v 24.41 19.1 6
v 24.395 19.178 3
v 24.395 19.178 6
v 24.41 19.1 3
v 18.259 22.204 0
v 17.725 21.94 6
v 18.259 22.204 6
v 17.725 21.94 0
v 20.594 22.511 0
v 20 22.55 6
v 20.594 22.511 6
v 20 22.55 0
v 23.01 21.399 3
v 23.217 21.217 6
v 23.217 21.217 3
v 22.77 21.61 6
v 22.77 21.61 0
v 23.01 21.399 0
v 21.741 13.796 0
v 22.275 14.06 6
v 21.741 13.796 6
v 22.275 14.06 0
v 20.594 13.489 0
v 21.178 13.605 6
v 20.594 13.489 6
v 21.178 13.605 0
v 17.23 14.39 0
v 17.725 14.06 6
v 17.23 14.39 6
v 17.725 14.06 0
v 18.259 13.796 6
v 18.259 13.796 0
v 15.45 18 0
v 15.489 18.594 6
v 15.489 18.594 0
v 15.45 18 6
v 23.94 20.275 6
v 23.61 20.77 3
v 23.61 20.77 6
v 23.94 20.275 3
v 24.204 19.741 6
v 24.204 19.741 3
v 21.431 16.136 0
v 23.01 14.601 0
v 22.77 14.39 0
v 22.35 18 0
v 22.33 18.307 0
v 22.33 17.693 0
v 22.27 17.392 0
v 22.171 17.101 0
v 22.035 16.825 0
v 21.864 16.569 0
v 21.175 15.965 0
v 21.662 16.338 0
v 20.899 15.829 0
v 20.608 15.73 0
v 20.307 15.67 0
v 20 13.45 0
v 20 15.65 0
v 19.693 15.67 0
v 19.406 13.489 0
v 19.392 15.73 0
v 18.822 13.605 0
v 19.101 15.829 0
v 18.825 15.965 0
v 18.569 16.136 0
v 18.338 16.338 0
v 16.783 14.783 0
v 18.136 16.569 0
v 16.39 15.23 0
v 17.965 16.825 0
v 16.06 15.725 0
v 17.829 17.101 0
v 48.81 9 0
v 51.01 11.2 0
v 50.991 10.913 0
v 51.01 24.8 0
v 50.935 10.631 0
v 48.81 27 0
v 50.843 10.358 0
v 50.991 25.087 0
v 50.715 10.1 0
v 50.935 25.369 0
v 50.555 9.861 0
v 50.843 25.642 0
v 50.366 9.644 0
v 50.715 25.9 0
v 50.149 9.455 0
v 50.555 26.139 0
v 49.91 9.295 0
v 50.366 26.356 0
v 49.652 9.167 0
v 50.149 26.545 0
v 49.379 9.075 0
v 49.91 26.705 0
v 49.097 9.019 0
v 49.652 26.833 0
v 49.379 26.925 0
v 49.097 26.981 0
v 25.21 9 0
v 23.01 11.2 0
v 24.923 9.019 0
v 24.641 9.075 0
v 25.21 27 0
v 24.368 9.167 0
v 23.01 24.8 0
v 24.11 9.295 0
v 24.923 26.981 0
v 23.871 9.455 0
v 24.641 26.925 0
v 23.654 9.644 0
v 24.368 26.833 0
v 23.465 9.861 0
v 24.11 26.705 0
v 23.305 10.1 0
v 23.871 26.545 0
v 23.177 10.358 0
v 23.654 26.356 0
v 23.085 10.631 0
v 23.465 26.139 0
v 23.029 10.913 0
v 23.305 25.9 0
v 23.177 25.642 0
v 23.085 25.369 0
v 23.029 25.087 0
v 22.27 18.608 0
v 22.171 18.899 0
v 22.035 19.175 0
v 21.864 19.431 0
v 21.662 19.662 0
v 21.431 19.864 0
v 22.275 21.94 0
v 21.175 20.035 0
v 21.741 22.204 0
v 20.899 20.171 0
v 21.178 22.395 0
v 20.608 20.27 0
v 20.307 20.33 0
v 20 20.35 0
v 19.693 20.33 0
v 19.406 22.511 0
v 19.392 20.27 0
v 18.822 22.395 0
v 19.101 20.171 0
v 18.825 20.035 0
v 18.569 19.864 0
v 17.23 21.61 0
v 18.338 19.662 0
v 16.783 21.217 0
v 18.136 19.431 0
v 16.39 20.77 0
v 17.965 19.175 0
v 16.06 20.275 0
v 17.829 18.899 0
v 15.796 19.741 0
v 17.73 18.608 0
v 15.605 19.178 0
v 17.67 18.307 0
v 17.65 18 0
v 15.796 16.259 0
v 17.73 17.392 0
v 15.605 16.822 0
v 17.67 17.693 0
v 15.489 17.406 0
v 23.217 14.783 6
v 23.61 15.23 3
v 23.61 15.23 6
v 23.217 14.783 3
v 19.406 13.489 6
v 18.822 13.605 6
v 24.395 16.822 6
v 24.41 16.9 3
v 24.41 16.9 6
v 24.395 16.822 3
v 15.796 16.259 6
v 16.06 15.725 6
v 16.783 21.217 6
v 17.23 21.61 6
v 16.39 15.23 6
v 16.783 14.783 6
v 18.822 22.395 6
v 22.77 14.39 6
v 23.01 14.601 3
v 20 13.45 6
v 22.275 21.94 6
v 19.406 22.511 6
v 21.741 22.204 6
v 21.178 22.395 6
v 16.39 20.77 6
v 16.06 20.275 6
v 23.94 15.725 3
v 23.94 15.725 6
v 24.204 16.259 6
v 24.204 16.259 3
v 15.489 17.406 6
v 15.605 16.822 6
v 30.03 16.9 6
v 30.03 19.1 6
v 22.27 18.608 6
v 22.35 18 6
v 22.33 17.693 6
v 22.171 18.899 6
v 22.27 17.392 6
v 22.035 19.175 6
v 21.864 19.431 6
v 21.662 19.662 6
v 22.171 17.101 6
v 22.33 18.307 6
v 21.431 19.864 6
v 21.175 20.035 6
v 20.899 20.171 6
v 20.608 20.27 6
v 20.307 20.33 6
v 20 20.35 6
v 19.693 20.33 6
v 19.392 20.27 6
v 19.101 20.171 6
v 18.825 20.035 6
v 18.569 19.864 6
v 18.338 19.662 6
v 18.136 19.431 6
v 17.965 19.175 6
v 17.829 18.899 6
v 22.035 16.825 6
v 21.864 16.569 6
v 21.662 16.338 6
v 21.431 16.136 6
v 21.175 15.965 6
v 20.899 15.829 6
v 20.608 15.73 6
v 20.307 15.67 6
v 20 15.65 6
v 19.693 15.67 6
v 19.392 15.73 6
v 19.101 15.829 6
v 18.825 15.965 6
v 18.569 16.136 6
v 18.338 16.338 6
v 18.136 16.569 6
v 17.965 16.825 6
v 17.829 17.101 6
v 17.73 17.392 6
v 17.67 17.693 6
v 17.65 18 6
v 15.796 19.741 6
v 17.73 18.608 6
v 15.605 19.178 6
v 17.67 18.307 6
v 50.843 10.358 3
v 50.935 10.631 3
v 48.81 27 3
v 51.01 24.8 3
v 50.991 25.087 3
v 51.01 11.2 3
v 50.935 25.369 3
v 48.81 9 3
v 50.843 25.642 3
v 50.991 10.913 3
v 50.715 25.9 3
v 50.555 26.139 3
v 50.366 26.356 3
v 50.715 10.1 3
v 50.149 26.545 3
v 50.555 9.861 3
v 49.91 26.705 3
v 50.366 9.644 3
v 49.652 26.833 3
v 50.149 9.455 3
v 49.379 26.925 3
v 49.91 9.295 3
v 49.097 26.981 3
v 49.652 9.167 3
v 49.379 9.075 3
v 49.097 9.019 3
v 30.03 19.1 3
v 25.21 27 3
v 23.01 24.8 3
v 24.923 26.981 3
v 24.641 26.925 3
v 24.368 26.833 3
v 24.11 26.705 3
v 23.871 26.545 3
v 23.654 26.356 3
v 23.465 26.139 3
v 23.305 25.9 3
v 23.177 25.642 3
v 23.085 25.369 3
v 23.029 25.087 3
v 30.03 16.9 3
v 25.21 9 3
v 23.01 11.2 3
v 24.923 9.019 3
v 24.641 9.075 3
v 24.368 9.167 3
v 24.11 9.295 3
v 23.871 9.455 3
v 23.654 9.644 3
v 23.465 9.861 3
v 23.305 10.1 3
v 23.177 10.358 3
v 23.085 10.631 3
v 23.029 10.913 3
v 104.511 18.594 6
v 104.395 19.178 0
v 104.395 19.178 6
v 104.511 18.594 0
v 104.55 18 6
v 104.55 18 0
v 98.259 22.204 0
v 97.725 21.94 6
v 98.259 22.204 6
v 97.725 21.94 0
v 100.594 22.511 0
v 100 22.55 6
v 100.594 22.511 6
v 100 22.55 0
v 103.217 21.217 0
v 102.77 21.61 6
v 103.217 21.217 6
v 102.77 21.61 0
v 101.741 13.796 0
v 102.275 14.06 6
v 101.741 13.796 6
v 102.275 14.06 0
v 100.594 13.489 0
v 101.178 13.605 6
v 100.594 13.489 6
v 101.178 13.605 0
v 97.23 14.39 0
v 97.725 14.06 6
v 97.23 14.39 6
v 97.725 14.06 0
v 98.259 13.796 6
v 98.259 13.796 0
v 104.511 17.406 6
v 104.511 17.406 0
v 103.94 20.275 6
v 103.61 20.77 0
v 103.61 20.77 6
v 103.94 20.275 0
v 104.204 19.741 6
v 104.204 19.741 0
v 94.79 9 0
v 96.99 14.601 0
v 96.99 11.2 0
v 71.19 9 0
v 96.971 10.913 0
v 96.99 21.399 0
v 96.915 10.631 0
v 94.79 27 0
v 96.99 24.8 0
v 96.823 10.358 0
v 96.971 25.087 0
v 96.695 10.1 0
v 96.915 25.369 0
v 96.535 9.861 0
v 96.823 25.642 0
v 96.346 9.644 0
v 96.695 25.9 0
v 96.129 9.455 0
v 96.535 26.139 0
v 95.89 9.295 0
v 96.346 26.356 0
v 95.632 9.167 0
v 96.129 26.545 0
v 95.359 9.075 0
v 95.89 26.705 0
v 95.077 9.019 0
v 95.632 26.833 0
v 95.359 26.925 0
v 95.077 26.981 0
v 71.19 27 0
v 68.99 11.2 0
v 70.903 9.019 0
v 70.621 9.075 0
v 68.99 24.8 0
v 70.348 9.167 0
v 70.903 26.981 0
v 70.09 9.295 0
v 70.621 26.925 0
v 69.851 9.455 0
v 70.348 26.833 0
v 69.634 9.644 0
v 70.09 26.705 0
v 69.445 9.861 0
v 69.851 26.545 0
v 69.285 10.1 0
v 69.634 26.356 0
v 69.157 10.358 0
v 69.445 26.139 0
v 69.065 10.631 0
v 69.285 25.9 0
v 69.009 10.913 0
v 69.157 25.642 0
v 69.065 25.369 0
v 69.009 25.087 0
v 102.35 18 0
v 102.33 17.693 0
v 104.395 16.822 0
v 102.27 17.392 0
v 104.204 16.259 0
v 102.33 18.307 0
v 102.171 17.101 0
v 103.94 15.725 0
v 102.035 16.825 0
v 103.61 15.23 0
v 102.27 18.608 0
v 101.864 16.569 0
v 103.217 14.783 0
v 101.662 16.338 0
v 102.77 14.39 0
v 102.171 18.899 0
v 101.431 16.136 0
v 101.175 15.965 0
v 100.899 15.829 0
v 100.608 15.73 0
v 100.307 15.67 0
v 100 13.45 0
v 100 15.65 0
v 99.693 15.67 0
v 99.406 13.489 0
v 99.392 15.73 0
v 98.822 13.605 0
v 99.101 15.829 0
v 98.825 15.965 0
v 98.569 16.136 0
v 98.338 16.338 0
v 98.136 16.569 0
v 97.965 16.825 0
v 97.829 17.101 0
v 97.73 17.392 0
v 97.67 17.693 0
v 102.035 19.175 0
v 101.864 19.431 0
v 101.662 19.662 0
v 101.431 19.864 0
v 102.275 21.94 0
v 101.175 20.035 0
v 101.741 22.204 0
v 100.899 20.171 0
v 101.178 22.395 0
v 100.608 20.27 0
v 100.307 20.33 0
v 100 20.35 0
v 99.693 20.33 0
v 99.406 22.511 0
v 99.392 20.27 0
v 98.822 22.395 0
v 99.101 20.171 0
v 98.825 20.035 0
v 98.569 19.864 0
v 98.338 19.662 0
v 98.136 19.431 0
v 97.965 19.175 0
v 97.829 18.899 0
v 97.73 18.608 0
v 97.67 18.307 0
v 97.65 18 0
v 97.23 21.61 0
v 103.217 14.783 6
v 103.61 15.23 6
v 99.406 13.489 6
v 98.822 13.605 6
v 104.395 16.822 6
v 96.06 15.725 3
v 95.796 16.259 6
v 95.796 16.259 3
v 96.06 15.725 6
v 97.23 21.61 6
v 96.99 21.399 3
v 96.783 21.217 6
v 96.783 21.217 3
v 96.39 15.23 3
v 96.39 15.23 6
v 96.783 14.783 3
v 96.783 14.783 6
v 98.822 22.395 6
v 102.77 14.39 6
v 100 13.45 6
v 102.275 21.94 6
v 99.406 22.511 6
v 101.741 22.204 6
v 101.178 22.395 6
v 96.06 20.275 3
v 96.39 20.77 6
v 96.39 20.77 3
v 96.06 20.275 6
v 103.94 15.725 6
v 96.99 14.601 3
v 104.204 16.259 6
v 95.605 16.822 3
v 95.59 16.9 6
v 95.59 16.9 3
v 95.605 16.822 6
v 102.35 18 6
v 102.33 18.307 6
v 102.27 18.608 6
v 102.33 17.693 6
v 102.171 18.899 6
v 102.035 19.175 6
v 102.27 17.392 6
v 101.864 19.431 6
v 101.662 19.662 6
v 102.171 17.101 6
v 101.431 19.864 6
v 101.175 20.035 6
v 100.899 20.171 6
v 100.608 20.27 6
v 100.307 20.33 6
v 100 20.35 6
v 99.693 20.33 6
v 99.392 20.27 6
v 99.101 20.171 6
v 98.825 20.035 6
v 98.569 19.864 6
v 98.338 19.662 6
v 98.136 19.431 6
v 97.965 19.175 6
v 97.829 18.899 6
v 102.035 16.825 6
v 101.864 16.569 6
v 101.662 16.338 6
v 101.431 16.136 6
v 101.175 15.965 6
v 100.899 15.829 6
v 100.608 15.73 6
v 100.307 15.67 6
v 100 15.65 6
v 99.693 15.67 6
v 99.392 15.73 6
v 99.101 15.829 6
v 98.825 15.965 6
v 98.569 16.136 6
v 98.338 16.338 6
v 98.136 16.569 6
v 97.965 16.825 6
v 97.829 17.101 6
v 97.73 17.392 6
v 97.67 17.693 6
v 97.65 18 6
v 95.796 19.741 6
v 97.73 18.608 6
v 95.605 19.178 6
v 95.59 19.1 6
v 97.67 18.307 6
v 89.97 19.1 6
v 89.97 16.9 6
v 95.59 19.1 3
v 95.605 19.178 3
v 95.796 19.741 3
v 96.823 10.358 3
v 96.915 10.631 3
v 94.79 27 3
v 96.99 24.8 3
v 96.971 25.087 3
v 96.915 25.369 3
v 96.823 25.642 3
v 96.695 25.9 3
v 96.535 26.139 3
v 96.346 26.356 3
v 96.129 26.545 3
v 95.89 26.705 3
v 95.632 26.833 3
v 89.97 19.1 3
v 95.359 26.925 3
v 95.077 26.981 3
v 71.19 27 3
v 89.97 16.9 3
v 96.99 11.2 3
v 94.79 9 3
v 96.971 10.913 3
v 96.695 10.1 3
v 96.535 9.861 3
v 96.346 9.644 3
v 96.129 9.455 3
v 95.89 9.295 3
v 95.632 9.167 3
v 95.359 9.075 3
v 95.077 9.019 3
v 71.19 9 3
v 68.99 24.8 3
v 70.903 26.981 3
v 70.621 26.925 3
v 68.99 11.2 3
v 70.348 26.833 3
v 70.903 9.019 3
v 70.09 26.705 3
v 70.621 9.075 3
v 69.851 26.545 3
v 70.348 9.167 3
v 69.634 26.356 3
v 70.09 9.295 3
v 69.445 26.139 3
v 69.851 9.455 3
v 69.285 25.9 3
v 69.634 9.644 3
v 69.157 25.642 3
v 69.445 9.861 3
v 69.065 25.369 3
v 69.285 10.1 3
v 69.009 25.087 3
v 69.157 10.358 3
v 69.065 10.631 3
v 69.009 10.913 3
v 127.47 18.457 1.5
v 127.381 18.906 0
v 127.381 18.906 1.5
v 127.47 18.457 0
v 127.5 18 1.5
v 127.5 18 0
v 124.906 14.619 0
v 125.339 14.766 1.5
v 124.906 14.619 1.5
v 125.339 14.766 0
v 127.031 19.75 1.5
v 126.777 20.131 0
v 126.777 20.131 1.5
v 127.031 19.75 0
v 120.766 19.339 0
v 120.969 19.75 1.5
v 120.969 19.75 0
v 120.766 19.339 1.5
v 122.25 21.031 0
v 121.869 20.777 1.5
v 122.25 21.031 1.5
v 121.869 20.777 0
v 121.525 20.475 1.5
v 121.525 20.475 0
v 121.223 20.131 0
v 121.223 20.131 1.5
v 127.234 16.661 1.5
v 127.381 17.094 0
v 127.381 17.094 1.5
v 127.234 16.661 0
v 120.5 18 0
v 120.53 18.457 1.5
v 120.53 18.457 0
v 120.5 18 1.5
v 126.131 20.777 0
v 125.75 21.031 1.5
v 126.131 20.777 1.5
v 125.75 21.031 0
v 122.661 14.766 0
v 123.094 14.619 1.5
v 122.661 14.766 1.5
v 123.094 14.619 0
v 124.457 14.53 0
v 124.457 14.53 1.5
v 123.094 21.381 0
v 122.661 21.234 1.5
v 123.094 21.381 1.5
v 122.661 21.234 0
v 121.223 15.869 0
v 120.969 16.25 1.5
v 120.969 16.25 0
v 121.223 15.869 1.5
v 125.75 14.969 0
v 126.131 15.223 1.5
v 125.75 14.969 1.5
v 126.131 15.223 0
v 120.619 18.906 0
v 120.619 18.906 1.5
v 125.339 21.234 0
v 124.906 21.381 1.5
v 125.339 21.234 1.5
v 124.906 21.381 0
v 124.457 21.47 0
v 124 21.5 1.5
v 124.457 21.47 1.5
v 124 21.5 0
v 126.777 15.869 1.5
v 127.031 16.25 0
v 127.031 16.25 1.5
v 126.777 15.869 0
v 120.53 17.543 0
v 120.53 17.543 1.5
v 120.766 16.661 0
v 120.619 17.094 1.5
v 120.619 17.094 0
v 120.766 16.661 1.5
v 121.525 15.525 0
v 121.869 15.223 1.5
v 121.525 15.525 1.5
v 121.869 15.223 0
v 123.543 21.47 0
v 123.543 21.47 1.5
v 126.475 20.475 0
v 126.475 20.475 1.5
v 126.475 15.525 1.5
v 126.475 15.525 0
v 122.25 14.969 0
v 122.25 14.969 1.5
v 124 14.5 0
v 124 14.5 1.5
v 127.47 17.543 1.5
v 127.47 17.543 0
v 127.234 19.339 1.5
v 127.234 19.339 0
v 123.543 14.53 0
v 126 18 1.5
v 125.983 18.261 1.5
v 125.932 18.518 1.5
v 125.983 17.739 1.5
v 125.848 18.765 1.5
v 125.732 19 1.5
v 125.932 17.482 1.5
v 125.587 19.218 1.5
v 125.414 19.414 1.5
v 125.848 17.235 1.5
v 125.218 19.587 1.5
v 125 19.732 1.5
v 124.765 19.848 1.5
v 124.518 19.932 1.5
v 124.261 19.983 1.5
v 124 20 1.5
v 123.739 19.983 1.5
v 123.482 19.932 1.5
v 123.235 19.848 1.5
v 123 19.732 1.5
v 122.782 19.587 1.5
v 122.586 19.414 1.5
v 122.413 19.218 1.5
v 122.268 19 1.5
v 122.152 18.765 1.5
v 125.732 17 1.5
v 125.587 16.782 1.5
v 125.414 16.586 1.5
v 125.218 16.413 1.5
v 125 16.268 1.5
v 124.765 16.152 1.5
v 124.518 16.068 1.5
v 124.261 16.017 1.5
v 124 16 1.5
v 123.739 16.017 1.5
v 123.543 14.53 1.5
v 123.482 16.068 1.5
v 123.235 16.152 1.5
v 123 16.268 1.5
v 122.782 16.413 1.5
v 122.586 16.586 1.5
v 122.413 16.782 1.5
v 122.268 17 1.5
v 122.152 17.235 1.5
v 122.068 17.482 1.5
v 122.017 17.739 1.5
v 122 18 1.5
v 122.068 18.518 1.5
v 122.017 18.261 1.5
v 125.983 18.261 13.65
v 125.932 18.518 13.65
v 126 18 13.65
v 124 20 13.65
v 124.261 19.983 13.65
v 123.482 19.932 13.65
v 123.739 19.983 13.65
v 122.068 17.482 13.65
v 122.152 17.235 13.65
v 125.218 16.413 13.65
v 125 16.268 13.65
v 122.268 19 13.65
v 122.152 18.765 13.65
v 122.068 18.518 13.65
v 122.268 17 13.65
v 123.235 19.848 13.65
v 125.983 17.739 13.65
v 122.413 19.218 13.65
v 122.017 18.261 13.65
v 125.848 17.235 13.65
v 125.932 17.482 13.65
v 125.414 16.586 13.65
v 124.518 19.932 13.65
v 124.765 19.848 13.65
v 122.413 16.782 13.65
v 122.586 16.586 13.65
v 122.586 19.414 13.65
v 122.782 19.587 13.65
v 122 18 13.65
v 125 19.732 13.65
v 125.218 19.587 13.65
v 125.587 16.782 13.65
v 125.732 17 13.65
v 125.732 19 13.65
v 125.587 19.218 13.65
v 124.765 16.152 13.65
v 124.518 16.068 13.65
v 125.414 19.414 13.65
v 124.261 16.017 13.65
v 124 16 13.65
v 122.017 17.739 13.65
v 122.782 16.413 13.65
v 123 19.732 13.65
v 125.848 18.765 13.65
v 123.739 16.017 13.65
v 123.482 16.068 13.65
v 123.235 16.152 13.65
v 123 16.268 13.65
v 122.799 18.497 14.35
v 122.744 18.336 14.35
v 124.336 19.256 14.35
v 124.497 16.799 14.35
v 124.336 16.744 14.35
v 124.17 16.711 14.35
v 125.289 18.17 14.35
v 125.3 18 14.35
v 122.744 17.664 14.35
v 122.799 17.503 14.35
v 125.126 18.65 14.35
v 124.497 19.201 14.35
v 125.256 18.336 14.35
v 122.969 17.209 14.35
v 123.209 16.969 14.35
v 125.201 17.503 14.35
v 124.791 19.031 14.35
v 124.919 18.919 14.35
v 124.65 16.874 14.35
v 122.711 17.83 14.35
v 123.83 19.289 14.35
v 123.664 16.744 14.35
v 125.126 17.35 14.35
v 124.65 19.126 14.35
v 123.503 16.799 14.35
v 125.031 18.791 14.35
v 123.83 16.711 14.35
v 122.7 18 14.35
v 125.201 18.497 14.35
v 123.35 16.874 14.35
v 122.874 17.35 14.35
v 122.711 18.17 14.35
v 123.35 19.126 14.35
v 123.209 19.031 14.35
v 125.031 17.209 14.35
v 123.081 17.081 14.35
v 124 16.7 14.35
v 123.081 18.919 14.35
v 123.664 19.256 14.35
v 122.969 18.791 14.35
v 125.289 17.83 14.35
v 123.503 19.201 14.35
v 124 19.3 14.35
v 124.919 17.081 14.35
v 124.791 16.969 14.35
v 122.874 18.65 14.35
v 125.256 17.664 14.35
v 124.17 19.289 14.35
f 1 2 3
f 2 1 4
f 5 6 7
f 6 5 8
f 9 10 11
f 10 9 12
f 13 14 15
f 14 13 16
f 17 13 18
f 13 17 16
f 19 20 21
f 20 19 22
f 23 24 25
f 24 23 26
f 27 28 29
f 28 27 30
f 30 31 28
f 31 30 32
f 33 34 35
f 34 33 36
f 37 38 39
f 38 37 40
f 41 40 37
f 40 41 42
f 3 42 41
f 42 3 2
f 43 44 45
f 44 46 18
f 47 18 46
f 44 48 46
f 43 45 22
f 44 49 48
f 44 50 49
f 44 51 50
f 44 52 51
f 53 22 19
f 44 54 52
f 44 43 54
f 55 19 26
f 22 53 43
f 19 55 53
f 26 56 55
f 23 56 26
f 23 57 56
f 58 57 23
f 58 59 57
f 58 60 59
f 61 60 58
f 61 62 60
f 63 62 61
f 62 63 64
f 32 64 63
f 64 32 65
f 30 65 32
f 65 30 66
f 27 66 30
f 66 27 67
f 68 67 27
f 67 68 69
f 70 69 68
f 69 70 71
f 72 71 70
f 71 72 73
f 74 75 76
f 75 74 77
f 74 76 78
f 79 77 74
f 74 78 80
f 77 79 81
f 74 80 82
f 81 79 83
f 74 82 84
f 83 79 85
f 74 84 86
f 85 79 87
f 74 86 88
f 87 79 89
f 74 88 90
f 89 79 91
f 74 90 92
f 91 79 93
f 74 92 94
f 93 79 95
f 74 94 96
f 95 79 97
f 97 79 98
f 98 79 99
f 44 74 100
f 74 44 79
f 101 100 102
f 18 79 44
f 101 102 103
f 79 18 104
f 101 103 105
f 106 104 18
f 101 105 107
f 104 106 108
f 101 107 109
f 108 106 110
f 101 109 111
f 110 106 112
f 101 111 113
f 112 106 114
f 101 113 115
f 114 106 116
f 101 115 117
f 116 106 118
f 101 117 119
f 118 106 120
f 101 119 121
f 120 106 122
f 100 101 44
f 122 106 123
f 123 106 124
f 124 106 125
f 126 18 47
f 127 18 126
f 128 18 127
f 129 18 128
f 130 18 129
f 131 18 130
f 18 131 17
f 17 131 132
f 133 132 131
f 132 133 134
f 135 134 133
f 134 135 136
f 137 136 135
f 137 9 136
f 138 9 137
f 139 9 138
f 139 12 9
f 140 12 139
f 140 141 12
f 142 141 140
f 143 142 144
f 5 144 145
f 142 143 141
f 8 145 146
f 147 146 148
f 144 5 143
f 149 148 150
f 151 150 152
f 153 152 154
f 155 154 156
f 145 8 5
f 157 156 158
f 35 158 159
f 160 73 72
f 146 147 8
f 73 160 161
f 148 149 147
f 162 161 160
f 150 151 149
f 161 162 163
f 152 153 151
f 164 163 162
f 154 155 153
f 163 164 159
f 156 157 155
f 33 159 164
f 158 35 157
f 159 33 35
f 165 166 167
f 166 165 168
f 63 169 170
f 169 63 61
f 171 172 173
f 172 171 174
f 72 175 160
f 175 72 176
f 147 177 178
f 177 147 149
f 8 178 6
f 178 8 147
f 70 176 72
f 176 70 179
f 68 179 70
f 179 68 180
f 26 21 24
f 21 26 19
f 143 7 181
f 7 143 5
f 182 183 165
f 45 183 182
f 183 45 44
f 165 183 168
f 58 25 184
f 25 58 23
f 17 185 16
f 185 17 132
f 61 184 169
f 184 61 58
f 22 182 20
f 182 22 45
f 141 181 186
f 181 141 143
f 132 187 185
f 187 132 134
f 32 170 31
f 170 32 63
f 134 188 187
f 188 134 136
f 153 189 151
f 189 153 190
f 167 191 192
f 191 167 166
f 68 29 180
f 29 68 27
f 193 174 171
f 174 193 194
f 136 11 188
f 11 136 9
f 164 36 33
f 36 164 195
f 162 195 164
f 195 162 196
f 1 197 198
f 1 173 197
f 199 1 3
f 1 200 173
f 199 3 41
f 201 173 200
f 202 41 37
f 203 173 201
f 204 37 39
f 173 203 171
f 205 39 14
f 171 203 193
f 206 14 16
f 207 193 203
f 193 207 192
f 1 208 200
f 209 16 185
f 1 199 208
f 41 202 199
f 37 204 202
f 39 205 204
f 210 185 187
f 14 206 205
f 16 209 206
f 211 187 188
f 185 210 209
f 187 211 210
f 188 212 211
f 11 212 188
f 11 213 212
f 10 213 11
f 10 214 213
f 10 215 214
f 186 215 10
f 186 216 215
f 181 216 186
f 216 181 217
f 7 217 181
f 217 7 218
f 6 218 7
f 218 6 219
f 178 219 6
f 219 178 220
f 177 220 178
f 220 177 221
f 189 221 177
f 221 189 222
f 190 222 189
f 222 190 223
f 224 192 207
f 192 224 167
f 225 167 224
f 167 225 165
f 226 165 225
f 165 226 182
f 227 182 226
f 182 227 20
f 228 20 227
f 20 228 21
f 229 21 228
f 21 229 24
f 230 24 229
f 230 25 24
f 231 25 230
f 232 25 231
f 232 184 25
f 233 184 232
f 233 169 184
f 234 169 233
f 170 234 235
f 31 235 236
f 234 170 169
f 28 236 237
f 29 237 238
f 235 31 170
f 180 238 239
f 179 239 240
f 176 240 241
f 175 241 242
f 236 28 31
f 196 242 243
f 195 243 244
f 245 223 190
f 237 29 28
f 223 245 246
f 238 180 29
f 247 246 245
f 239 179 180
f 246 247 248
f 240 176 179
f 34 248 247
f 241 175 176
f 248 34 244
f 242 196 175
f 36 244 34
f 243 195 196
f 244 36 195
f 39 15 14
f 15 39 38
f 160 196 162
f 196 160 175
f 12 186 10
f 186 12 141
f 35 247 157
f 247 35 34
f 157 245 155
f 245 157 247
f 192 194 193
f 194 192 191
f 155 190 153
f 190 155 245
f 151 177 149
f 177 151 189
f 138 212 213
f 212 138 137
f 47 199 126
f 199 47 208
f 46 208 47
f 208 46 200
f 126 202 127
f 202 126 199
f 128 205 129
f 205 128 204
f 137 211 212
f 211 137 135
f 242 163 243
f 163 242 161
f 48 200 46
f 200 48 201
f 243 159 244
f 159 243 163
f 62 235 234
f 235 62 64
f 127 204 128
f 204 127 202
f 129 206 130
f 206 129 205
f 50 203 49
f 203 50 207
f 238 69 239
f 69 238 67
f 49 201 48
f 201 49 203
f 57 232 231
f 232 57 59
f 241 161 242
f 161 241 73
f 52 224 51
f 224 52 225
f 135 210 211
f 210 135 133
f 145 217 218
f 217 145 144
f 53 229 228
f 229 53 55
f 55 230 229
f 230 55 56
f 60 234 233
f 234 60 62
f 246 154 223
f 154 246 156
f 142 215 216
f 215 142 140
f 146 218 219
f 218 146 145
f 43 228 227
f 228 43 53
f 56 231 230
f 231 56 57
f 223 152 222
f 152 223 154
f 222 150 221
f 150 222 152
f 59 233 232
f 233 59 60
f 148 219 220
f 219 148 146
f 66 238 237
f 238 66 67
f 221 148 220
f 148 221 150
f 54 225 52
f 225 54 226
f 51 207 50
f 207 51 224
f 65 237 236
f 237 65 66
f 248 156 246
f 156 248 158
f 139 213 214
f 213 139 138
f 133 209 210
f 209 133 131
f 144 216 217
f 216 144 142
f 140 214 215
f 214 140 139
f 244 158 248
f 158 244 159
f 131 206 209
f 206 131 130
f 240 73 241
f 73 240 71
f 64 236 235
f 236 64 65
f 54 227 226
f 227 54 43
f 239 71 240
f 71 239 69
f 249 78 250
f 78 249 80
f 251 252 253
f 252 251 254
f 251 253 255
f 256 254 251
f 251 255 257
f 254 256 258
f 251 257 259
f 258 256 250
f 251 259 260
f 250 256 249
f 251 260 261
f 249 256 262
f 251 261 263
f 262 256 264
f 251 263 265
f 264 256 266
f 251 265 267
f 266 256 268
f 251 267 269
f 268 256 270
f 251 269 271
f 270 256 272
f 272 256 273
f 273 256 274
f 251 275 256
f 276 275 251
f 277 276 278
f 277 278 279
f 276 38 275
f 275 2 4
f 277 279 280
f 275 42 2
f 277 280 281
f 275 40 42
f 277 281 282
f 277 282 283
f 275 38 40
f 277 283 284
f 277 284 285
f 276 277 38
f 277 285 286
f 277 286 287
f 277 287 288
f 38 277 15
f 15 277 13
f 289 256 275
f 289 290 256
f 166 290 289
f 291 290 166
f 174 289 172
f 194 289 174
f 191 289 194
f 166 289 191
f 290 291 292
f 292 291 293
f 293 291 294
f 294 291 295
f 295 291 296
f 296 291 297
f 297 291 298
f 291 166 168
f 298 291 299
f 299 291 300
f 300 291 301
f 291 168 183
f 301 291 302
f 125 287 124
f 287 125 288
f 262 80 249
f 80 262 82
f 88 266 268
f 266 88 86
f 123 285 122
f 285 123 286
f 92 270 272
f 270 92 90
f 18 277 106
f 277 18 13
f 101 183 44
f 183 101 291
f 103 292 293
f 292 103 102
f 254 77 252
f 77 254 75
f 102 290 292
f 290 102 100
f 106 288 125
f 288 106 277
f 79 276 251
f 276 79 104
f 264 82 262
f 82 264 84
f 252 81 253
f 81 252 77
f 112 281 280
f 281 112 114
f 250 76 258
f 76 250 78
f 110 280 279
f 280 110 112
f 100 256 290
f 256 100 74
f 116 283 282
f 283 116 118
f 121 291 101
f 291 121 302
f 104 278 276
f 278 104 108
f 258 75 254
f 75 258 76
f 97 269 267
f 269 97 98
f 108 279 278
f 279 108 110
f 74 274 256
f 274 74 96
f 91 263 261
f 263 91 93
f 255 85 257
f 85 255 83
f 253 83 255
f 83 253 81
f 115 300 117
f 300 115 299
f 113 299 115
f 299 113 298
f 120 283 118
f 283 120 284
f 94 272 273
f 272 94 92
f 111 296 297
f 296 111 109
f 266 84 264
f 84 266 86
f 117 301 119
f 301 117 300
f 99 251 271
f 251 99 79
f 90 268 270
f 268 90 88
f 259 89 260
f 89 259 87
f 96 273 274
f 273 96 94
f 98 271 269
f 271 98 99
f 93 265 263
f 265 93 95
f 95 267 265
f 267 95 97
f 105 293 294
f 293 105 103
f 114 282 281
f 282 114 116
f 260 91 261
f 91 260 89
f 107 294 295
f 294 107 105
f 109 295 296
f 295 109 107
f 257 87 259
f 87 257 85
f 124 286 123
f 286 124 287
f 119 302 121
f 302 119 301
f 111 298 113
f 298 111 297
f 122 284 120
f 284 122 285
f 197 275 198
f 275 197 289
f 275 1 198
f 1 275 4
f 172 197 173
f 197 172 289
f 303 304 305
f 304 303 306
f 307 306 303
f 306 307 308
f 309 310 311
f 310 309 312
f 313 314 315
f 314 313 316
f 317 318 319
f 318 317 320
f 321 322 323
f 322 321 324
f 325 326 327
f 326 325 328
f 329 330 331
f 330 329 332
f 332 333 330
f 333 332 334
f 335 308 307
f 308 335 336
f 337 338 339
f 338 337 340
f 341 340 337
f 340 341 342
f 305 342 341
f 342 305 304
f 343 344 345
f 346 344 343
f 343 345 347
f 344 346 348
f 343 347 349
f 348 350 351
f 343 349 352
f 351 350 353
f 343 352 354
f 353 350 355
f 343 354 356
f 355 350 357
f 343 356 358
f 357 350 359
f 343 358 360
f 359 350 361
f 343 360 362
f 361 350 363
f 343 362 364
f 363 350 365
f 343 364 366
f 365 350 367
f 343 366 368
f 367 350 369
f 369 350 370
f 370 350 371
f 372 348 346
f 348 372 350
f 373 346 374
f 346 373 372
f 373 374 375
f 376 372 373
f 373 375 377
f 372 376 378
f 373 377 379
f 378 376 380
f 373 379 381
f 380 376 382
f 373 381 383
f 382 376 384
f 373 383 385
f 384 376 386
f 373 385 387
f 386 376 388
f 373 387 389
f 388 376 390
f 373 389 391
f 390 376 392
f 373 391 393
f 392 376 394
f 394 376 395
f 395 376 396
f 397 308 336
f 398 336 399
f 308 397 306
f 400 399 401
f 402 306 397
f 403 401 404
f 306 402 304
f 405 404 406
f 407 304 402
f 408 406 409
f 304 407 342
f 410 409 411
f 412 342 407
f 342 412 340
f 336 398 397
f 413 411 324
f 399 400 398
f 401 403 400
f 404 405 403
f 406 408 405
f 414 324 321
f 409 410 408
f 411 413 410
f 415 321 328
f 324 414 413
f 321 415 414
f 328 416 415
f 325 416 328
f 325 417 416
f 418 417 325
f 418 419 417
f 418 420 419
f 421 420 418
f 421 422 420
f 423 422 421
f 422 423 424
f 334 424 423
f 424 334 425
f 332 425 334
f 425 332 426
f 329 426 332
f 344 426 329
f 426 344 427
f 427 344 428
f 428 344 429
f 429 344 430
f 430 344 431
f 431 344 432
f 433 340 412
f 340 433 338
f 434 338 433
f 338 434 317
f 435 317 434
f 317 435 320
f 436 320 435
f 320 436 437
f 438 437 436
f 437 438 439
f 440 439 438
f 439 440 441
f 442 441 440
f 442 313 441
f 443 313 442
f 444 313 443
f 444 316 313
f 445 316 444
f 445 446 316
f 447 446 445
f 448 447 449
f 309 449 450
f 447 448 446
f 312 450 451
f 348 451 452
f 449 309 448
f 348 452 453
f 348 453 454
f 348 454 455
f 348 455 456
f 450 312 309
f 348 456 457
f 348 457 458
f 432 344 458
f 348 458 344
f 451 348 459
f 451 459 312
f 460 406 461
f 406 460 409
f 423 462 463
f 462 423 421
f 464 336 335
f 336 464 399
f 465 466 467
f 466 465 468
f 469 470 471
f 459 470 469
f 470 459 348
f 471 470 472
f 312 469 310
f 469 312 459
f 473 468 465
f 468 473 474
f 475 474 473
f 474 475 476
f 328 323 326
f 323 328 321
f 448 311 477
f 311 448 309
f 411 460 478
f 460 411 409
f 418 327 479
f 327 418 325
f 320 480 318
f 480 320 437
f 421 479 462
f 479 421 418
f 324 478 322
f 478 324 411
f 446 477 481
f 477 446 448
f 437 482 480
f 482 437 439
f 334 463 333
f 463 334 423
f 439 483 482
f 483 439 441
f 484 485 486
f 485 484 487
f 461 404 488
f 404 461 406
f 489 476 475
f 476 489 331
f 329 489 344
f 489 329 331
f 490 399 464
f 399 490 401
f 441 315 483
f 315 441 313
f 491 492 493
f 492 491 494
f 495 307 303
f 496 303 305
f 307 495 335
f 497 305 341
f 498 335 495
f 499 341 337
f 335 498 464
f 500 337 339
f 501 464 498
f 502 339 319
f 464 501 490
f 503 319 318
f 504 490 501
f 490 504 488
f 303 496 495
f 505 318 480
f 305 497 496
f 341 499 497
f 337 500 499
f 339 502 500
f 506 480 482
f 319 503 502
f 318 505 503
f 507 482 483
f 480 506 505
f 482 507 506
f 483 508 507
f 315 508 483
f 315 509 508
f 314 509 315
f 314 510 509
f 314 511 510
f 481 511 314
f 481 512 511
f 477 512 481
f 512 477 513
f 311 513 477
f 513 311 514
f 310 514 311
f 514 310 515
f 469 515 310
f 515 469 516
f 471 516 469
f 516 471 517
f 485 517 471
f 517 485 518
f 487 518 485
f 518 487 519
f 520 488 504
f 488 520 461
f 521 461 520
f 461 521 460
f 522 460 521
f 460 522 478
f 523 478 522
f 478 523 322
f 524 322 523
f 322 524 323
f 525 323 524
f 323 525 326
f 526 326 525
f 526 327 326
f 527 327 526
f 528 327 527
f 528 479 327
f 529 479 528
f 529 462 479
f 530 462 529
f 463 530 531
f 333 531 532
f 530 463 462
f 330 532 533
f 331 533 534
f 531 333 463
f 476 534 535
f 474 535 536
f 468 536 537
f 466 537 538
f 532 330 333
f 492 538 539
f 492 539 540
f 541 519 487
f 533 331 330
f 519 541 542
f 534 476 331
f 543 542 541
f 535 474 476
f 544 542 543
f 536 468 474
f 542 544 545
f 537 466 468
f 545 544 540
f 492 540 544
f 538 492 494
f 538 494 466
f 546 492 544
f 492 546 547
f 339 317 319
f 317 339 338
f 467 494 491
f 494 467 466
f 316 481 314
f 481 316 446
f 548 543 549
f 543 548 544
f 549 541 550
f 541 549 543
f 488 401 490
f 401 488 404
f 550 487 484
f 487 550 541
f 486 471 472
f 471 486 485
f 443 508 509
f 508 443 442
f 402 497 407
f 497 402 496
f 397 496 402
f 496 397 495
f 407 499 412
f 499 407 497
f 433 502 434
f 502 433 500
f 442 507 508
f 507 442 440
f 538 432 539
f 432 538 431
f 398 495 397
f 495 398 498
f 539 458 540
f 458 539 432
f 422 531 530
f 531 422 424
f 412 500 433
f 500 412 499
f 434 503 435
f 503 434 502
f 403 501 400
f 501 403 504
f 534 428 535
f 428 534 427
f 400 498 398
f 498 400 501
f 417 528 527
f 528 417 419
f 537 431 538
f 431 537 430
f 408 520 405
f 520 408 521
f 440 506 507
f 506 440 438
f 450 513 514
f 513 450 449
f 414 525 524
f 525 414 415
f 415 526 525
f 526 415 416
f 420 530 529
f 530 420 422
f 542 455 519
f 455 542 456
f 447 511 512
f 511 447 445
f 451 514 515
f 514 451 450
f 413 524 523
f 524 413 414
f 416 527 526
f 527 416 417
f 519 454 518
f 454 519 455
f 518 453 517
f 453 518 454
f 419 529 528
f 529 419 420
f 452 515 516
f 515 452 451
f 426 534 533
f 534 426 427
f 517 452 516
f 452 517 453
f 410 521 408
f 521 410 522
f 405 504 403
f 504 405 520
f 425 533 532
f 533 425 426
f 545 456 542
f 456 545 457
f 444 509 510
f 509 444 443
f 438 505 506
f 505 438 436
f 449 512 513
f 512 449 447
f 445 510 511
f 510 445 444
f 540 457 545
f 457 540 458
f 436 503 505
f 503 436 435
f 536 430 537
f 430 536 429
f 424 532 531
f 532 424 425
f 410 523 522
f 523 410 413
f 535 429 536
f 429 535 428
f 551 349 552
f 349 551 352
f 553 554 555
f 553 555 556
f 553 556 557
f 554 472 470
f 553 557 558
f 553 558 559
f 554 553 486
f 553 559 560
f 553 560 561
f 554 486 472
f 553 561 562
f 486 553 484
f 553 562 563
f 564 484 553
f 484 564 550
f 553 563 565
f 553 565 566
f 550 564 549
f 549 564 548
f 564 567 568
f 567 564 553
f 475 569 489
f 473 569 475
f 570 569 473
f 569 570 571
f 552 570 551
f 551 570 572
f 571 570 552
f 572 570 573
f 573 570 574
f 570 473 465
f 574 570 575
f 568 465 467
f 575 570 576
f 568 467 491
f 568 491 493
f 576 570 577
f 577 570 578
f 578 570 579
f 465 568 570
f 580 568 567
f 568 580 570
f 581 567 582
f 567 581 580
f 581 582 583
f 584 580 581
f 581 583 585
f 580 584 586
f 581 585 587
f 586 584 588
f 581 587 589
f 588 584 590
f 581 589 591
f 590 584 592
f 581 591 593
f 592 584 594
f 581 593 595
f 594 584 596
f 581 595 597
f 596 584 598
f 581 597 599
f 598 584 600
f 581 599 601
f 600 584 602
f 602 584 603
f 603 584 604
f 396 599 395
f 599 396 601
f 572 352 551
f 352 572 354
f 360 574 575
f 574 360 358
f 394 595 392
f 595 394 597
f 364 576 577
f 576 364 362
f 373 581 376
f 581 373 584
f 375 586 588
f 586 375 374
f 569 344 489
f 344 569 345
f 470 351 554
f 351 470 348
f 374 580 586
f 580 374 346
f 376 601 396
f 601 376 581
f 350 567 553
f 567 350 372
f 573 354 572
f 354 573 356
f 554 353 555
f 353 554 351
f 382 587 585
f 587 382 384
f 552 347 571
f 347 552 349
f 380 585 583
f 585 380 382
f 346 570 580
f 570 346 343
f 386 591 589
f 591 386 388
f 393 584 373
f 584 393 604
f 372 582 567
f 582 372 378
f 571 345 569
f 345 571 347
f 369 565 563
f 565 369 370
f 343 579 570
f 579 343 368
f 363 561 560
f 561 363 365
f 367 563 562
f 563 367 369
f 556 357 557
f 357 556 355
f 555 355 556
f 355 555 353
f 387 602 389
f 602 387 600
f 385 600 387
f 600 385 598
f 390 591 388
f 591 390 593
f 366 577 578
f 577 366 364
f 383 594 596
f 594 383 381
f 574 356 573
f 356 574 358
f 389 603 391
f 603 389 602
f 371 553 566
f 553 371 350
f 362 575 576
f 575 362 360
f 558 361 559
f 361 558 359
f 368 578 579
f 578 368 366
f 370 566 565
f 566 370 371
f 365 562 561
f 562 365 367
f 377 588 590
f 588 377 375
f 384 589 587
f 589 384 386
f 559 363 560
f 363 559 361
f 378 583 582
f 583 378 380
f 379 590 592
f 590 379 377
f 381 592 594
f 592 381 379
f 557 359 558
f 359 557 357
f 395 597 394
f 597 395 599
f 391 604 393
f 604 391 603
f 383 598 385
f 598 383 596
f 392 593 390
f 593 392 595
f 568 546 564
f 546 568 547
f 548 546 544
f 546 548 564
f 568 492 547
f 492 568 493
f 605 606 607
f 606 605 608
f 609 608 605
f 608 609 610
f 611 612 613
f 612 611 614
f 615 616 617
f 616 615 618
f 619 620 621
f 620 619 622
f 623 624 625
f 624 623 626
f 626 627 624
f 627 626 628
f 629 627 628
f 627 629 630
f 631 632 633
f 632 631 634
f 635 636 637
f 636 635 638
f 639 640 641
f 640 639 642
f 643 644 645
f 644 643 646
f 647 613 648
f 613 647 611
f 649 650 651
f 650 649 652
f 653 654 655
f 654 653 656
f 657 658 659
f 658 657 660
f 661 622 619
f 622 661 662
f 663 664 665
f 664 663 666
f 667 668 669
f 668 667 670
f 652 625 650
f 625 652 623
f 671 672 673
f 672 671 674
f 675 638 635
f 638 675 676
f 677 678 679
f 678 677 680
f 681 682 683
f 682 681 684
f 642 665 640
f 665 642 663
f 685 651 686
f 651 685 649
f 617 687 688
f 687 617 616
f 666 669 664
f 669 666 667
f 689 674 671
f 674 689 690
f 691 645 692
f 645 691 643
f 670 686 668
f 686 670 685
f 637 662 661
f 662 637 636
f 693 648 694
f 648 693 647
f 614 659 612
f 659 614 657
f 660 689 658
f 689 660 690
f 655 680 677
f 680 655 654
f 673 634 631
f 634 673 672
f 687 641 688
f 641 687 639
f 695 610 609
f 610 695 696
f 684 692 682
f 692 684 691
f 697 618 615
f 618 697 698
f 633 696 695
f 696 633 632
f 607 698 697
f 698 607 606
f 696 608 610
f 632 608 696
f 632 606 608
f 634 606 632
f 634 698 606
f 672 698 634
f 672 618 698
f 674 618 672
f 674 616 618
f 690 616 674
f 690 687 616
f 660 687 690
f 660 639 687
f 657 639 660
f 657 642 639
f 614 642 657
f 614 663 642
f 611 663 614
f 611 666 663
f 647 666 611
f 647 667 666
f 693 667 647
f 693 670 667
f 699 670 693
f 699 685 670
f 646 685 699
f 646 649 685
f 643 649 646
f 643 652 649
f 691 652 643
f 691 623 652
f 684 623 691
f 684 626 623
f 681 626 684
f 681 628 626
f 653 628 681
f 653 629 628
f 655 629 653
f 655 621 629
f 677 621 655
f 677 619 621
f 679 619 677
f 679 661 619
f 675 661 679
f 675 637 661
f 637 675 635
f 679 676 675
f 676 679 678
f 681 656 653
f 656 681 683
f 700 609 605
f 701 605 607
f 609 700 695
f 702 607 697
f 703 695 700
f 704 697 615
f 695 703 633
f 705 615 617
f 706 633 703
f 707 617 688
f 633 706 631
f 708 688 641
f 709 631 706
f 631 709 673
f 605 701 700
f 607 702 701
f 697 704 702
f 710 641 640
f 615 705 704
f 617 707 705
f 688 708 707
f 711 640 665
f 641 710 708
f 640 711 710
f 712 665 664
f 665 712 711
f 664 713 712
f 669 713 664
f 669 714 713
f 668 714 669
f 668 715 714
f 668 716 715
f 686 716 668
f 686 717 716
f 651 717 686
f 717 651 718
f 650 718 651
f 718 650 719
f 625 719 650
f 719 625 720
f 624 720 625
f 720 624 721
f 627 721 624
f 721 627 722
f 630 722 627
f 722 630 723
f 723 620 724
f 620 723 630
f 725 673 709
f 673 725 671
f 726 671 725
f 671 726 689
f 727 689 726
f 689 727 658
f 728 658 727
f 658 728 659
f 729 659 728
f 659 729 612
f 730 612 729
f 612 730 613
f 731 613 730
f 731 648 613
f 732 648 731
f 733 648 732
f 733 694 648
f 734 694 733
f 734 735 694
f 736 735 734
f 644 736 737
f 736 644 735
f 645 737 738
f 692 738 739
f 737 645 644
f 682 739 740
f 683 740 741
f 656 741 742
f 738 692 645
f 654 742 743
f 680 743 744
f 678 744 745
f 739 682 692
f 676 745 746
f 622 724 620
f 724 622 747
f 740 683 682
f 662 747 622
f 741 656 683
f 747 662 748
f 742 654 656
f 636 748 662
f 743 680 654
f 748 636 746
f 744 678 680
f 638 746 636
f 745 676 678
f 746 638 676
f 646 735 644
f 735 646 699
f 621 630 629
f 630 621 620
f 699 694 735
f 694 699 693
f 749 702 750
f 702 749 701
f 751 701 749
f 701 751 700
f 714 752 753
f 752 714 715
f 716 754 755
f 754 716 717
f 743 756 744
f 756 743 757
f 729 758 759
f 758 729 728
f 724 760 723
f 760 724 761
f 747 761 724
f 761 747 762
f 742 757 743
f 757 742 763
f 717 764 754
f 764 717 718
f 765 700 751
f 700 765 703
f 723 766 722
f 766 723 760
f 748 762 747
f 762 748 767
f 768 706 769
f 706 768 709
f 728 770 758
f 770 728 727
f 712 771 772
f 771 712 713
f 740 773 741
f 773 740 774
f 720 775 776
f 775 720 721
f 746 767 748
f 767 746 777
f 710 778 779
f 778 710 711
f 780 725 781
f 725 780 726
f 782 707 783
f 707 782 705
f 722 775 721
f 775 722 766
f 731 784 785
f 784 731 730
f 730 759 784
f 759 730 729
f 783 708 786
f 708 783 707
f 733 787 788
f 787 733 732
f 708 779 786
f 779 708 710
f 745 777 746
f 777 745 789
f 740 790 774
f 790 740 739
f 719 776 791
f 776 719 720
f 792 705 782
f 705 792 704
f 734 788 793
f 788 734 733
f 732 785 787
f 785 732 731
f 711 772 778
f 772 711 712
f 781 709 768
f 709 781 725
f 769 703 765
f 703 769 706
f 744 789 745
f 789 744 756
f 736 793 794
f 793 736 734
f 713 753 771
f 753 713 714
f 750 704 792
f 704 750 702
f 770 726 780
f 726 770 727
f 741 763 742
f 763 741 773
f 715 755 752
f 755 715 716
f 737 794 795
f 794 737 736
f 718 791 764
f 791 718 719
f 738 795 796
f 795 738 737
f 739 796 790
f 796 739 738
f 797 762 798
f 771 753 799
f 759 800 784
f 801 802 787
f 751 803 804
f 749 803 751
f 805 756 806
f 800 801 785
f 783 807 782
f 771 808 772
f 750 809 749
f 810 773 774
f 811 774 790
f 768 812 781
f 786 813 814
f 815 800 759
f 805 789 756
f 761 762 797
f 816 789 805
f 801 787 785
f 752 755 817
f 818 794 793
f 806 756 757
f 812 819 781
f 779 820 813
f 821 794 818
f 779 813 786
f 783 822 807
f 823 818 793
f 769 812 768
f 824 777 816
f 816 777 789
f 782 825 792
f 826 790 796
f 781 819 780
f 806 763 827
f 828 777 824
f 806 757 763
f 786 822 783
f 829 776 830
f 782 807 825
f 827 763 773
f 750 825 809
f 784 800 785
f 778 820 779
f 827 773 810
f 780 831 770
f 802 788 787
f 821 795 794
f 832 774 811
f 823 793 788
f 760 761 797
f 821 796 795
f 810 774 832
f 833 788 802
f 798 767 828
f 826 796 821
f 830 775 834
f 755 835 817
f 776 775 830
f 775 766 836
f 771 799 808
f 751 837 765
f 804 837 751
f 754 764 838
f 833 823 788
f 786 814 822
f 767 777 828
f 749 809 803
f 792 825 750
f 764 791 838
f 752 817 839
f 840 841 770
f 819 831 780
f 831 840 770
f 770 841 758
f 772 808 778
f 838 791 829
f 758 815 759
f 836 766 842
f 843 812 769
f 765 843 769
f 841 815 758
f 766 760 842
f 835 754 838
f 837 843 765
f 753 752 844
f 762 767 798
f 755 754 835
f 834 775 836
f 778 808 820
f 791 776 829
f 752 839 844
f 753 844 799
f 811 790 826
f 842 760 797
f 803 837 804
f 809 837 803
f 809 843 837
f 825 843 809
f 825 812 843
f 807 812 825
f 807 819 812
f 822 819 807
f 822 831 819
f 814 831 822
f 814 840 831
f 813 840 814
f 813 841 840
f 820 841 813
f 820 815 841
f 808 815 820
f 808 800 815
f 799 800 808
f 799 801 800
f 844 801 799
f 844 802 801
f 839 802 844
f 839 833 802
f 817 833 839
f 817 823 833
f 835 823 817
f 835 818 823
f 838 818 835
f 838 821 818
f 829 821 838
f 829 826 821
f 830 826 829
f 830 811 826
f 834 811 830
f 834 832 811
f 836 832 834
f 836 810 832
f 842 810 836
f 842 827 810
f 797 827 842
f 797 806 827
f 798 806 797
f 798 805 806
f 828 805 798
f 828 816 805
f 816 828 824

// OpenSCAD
/*
Sample 003: Versetztes Stiftgelenk — leichtgängig
Generated from the FDM Mechanical Sample Library.
Units: millimetres.

Override examples:
  openscad -o custom.stl -D 'view="plate"' -D 'render_fn=64' model.scad
  openscad -o preview.png -D 'view="assembly"' model.scad
*/
use <../../../library/fdm_mechanisms.scad>

render_fn = is_undef(render_fn) ? 48 : render_fn;
view = is_undef(view) ? "plate" : view;
$fn = render_fn;

sample_pin_hinge(
    view=view,
    clearance=0.35,
    pin_d=4,
    leaf_l=28
);
